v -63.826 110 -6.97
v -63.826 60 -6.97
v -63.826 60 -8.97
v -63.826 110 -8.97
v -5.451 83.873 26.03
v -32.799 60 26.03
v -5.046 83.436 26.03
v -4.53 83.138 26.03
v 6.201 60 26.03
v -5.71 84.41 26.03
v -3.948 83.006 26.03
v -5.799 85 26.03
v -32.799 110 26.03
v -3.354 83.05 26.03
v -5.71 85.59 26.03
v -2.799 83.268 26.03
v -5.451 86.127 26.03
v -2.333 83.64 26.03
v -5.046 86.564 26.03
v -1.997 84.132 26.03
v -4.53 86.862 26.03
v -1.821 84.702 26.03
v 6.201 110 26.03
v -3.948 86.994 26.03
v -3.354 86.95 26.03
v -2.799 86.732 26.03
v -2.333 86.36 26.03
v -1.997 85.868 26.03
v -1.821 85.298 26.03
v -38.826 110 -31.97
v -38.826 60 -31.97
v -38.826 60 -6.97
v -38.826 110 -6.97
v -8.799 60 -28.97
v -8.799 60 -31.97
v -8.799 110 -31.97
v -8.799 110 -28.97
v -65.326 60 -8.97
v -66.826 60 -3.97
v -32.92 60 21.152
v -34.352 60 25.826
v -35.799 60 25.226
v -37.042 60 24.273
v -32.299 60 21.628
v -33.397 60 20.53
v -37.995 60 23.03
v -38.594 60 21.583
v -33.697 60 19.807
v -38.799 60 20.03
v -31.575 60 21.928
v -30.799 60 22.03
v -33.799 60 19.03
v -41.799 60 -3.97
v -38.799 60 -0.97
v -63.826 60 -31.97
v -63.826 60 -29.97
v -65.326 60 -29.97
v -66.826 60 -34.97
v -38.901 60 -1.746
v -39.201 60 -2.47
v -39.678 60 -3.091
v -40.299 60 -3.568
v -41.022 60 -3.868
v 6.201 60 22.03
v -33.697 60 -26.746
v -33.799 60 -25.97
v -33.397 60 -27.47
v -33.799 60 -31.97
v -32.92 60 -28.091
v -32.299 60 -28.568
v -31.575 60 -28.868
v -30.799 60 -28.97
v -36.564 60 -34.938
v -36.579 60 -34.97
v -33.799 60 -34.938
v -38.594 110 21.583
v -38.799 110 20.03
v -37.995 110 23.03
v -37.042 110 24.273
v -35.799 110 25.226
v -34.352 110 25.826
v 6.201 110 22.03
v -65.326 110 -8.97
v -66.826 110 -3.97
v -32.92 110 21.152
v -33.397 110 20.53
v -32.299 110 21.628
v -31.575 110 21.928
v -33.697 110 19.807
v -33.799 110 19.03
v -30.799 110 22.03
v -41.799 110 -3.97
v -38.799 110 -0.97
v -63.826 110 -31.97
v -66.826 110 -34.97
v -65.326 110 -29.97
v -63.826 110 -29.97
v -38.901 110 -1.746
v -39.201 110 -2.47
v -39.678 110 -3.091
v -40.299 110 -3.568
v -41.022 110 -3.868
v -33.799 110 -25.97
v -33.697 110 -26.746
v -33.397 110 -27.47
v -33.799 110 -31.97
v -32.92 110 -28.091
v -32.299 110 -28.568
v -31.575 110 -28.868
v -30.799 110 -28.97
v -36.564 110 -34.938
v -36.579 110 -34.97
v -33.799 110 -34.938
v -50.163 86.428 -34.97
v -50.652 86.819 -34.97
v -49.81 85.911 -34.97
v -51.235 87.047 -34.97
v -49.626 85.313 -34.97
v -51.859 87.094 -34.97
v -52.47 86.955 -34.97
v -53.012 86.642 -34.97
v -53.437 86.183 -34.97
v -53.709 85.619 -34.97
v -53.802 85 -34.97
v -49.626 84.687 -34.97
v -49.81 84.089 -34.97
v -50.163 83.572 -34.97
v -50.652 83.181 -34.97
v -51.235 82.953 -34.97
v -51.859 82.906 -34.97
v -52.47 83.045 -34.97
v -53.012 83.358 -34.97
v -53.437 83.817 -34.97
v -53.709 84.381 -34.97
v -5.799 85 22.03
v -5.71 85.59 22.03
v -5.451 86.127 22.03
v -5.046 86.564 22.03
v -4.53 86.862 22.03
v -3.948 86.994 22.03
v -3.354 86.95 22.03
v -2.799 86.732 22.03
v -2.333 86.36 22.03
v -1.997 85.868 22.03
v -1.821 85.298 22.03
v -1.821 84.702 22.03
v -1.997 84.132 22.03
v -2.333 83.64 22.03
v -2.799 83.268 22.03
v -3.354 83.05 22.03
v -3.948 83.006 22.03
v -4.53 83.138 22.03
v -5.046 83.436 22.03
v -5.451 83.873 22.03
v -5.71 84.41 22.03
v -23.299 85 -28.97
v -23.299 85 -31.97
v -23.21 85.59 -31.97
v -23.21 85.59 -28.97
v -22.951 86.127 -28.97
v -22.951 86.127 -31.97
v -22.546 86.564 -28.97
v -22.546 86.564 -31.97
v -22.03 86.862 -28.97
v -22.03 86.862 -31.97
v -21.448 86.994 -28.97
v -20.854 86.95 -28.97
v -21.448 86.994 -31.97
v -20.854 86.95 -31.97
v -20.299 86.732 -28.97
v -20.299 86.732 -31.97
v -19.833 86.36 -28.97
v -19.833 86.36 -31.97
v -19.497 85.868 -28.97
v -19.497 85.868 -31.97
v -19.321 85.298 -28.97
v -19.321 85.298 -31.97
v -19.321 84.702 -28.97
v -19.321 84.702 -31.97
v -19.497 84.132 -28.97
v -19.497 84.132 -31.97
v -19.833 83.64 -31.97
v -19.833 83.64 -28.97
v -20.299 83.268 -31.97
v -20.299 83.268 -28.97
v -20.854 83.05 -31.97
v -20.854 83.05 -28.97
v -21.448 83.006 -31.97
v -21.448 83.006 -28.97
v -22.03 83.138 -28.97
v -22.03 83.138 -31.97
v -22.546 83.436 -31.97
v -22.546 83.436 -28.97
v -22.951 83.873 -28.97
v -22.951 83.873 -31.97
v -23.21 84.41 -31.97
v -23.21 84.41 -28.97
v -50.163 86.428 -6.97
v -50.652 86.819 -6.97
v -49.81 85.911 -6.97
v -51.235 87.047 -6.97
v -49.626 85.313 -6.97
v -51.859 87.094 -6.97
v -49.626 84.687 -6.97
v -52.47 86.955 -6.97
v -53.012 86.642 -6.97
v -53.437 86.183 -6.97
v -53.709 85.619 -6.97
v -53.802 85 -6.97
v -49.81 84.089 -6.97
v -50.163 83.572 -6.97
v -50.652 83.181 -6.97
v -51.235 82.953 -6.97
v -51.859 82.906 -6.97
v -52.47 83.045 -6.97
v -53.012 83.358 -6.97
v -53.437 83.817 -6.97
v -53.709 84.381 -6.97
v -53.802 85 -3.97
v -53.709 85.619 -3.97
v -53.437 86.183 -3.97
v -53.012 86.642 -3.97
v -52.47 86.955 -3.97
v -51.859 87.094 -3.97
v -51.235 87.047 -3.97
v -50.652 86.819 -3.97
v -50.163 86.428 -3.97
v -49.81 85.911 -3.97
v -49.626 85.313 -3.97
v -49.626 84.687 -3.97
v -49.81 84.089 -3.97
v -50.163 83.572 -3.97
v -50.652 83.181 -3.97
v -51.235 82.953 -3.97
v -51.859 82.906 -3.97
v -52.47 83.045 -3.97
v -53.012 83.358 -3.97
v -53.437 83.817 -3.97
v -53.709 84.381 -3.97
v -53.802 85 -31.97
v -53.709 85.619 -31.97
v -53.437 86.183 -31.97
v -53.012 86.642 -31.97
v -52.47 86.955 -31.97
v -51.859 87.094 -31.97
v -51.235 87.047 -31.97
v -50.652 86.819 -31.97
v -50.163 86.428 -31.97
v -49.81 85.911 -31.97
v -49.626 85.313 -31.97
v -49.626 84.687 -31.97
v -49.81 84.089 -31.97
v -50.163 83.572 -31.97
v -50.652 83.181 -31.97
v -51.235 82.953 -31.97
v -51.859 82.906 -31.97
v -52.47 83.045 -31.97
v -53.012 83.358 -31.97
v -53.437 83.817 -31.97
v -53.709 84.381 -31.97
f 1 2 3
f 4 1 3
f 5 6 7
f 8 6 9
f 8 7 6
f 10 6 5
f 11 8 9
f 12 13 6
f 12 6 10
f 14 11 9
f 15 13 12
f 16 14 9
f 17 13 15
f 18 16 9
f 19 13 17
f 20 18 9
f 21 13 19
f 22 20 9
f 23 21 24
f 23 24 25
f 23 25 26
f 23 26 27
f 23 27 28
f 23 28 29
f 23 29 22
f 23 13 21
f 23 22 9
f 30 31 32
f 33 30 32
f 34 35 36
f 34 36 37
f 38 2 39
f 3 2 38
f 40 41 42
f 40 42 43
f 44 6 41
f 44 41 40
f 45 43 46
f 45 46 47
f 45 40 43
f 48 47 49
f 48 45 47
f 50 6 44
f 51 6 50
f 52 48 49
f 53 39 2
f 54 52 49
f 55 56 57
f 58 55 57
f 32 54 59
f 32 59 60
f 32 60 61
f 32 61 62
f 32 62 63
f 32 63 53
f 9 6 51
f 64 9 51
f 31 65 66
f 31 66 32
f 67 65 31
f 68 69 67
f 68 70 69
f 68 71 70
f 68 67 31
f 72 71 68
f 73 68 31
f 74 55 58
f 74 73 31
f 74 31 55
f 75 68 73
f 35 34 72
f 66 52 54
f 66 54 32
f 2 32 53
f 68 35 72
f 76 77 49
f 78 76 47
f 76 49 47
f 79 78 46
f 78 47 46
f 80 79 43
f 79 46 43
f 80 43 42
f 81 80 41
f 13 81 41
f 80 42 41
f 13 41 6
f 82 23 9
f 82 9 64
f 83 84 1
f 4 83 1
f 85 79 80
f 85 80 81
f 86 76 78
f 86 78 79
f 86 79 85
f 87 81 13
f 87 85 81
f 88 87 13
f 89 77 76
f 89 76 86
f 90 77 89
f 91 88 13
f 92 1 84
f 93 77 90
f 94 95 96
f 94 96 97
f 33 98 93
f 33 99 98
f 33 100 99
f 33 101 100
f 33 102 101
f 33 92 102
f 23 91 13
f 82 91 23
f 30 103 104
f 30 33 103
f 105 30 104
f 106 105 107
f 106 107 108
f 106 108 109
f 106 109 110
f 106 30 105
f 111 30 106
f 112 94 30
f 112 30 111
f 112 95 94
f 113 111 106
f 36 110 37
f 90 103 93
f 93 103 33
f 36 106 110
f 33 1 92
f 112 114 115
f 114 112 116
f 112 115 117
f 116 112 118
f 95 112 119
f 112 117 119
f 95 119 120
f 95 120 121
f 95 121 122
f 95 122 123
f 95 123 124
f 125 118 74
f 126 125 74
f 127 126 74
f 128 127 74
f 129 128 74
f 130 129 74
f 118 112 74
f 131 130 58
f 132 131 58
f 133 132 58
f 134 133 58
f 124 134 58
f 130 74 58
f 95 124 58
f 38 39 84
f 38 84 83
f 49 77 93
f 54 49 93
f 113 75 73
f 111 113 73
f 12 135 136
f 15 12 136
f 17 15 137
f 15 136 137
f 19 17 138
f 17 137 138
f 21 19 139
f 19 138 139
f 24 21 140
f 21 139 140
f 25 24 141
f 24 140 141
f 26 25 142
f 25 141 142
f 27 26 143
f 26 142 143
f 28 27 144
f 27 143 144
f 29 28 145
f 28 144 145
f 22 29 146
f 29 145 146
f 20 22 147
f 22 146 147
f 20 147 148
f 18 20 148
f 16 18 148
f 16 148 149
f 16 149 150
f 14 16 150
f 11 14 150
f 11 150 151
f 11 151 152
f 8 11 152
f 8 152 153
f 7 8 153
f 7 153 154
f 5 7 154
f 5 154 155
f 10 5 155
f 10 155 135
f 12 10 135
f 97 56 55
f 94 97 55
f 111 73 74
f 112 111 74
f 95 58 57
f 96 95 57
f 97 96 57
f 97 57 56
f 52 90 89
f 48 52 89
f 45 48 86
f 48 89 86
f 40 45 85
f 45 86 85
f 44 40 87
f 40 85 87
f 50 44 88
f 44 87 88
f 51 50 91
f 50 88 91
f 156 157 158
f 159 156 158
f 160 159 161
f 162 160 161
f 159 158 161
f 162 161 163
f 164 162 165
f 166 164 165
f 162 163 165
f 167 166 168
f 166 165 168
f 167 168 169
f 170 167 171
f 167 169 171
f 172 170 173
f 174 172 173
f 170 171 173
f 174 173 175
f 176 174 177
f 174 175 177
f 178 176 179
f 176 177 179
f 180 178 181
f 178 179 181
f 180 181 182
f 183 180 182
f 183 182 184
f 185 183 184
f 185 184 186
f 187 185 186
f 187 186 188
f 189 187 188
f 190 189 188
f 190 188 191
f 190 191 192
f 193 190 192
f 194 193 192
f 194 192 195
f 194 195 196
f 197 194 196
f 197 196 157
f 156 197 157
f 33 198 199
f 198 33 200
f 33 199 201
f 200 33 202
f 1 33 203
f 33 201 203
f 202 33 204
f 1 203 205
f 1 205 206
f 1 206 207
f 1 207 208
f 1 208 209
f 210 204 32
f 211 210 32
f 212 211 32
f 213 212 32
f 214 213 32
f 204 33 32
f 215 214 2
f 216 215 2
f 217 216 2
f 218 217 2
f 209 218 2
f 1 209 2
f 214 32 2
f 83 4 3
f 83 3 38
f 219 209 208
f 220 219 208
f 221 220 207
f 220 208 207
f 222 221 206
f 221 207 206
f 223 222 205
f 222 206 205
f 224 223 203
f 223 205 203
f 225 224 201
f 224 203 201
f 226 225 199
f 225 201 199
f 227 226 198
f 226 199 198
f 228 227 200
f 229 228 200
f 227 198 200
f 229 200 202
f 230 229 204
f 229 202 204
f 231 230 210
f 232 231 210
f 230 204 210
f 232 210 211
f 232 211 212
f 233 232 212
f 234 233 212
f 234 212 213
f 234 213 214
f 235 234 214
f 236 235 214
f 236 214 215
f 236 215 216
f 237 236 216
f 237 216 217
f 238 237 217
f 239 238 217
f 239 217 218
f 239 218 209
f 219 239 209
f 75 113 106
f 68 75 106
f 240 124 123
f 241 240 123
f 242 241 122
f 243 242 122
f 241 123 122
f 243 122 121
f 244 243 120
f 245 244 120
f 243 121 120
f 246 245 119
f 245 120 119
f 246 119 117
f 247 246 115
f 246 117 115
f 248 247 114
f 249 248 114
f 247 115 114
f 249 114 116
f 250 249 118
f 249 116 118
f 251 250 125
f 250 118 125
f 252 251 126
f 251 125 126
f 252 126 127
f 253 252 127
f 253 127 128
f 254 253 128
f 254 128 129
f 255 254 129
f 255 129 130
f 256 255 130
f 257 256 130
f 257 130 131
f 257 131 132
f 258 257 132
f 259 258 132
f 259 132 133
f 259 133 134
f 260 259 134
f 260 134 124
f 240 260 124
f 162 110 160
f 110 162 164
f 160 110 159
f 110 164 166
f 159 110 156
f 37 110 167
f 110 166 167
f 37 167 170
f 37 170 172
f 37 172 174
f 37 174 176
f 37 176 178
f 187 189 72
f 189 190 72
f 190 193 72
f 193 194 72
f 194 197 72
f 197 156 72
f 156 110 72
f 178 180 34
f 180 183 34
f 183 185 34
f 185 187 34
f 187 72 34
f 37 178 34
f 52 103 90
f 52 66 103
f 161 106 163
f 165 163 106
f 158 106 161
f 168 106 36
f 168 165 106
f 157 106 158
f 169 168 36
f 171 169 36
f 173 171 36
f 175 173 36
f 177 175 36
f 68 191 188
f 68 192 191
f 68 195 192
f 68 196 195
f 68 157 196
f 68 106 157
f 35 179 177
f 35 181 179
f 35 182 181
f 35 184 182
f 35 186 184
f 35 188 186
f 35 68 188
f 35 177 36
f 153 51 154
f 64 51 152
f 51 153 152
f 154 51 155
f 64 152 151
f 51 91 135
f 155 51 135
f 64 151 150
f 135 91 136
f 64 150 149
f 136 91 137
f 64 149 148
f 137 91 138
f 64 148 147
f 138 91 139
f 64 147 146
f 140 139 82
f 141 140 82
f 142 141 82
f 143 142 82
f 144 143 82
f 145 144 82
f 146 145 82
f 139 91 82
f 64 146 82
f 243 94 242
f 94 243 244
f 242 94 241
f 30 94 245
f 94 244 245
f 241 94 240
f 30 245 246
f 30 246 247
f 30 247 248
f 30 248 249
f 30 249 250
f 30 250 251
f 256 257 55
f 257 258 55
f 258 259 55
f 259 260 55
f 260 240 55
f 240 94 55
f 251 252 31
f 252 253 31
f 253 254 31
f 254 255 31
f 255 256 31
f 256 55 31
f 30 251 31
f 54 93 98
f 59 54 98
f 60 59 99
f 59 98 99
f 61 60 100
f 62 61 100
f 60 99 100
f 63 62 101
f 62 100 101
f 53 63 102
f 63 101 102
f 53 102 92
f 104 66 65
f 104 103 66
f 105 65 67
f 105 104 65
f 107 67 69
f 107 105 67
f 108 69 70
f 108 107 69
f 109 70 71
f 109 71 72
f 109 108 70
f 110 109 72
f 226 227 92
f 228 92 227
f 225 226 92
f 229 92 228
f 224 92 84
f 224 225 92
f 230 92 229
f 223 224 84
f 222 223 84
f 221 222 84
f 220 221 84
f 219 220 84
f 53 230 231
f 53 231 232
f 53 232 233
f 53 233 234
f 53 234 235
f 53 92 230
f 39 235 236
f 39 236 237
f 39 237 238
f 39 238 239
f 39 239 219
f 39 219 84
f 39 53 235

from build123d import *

# Parameters (mm, degrees)
EXTRUDE_1_DEPTH      = 110
CUT_EXTRUDE_4_DEPTH  = 134.373777696
SKETCH_7_W           = 16.60831278
SKETCH_7_H           = 38.473598513
CUT_EXTRUDE_14_DEPTH = 134.373777696
SKETCH_8_W           = 5
SKETCH_8_H           = 30.968526609
EXTRUDE_2_DEPTH      = 110
SKETCH_10_W          = 5
SKETCH_10_H          = 26
EXTRUDE_4_DEPTH      = 110
SKETCH_16_W          = 45
SKETCH_16_H          = 4
EXTRUDE_7_DEPTH      = 110
FILLET_4_R           = 3
FILLET_5_R           = 6
SKETCH_18_W          = 113.67218818
SKETCH_18_H          = 61.649849458
CUT_EXTRUDE_18_DEPTH = 137.586229955
SKETCH_19_R          = 2.1
SKETCH_19_R_2        = 2
CUT_EXTRUDE_19_DEPTH = 143.431323365
SKETCH_22_W          = 25
SKETCH_22_H          = 3
EXTRUDE_10_DEPTH     = 50
FILLET_7_R           = 3
SKETCH_23_R          = 2
CUT_EXTRUDE_24_DEPTH = 10


with BuildPart() as part:
    # Эскиз1 → Бобышка-Вытянуть1 (new body)
    with BuildSketch(Plane(origin=(0, 0, 0), x_dir=(1, 0, 0), z_dir=(0, 1, 0))):
        Polygon((-66.825757576, 34.969739794), (-66.825757576, 29.969739794), (-63.825757576, 29.969739794), (-63.825757576, 31.969739794), (-38.825757576, 31.969739794), (-38.825757576, 6.969739794), (-63.825757576, 6.969739794), (-63.825757576, 8.969739794), (-66.825757576, 8.969739794), (-66.825757576, 3.969739794), (-22.123470102, 3.969739794), (-36.579007505, 34.969739794), align=None)
    extrude(amount=EXTRUDE_1_DEPTH)

    # Эскиз3 → Вырез-Вытянуть4 (cut, through all)
    with BuildSketch(Plane.XZ):
        Polygon((-66.825757576, -3.969739794), (-65.325757576, -8.969739794), (-66.825757576, -8.969739794), align=None)
        Polygon((-66.825757576, -29.969739794), (-66.825757576, -34.969739794), (-65.325757576, -29.969739794), align=None)
    extrude(amount=-CUT_EXTRUDE_4_DEPTH, mode=Mode.SUBTRACT)

    # Эскиз7 → Вырез-Вытянуть14 (cut, through all)
    with BuildSketch(Plane(origin=(0, 0, 0), x_dir=(-1, 0, 0), z_dir=(0, -1, 0))):
        with Locations((27.703474463, 20.539743139)):
            Rectangle(SKETCH_7_W, SKETCH_7_H)
    extrude(amount=-CUT_EXTRUDE_14_DEPTH, mode=Mode.SUBTRACT)

    # Эскиз8 → Бобышка-Вытянуть2 (add)
    with BuildSketch(Plane(origin=(0, 0, 0), x_dir=(-1, 0, 0), z_dir=(0, -1, 0))):
        with Locations((36.298943925, 19.454003098)):
            Rectangle(SKETCH_8_W, SKETCH_8_H)
    extrude(amount=-EXTRUDE_2_DEPTH)

    # Эскиз10 → Бобышка-Вытянуть4 (add)
    with BuildSketch(Plane.XZ):
        with Locations((-36.298943925, 9.030260206)):
            Rectangle(SKETCH_10_W, SKETCH_10_H)
    extrude(amount=-EXTRUDE_4_DEPTH)

    # Эскиз16 → Бобышка-Вытянуть7 (add, through all)
    with BuildSketch(Plane(origin=(0, 110, 0), x_dir=(1, 0, 0), z_dir=(0, 1, 0))):
        with Locations((-16.298943925, -24.030260206)):
            Rectangle(SKETCH_16_W, SKETCH_16_H)
    extrude(amount=-EXTRUDE_7_DEPTH)

    # Скругление4
    fillet_4_edges = [part.edges().sort_by_distance(p)[0] for p in [
        (-38.798943925, 55, -3.969739794),
        (-33.798943925, 55, 22.030260206),
    ]]
    fillet(fillet_4_edges, radius=FILLET_4_R)

    # Скругление5
    fillet_5_edges = [part.edges().sort_by_distance(p)[0] for p in [
        (-38.798943925, 55, 26.030260206),
    ]]
    fillet(fillet_5_edges, radius=FILLET_5_R)

    # Эскиз18 → Вырез-Вытянуть18 (cut, through all)
    with BuildSketch(Plane(origin=(6.201056075, 0, 0), x_dir=(0, 0, -1), z_dir=(1, 0, 0))):
        with Locations((3.709673157, 29.175075271)):
            Rectangle(SKETCH_18_W, SKETCH_18_H)
    extrude(amount=-CUT_EXTRUDE_18_DEPTH, mode=Mode.SUBTRACT)

    # Эскиз19 → Вырез-Вытянуть19 (cut, through all)
    with BuildSketch(Plane(origin=(0, 0, -34.969739794), x_dir=(-1, 0, 0), z_dir=(0, 0, -1))):
        with Locations((51.70238254, 85)):
            Circle(SKETCH_19_R)
        with Locations((3.798943925, 85)):
            Circle(SKETCH_19_R_2)
    extrude(amount=-CUT_EXTRUDE_19_DEPTH, mode=Mode.SUBTRACT)

    # Эскиз22 → Бобышка-Вытянуть10 (add)
    with BuildSketch(Plane.XZ.offset(-60)):
        with Locations((-21.298943925, -30.469739794)):
            Rectangle(SKETCH_22_W, SKETCH_22_H)
    extrude(amount=-EXTRUDE_10_DEPTH)

    # Скругление7
    fillet_7_edges = [part.edges().sort_by_distance(p)[0] for p in [
        (-33.798943925, 85, -28.969739794),
    ]]
    fillet(fillet_7_edges, radius=FILLET_7_R)

    # Эскиз23 → Вырез-Вытянуть24 (cut)
    with BuildSketch(Plane(origin=(0, 0, -31.969739794), x_dir=(-1, 0, 0), z_dir=(0, 0, -1))):
        with Locations((21.298943925, 85)):
            Circle(SKETCH_23_R)
    extrude(amount=-CUT_EXTRUDE_24_DEPTH, mode=Mode.SUBTRACT)


solid = part.part
